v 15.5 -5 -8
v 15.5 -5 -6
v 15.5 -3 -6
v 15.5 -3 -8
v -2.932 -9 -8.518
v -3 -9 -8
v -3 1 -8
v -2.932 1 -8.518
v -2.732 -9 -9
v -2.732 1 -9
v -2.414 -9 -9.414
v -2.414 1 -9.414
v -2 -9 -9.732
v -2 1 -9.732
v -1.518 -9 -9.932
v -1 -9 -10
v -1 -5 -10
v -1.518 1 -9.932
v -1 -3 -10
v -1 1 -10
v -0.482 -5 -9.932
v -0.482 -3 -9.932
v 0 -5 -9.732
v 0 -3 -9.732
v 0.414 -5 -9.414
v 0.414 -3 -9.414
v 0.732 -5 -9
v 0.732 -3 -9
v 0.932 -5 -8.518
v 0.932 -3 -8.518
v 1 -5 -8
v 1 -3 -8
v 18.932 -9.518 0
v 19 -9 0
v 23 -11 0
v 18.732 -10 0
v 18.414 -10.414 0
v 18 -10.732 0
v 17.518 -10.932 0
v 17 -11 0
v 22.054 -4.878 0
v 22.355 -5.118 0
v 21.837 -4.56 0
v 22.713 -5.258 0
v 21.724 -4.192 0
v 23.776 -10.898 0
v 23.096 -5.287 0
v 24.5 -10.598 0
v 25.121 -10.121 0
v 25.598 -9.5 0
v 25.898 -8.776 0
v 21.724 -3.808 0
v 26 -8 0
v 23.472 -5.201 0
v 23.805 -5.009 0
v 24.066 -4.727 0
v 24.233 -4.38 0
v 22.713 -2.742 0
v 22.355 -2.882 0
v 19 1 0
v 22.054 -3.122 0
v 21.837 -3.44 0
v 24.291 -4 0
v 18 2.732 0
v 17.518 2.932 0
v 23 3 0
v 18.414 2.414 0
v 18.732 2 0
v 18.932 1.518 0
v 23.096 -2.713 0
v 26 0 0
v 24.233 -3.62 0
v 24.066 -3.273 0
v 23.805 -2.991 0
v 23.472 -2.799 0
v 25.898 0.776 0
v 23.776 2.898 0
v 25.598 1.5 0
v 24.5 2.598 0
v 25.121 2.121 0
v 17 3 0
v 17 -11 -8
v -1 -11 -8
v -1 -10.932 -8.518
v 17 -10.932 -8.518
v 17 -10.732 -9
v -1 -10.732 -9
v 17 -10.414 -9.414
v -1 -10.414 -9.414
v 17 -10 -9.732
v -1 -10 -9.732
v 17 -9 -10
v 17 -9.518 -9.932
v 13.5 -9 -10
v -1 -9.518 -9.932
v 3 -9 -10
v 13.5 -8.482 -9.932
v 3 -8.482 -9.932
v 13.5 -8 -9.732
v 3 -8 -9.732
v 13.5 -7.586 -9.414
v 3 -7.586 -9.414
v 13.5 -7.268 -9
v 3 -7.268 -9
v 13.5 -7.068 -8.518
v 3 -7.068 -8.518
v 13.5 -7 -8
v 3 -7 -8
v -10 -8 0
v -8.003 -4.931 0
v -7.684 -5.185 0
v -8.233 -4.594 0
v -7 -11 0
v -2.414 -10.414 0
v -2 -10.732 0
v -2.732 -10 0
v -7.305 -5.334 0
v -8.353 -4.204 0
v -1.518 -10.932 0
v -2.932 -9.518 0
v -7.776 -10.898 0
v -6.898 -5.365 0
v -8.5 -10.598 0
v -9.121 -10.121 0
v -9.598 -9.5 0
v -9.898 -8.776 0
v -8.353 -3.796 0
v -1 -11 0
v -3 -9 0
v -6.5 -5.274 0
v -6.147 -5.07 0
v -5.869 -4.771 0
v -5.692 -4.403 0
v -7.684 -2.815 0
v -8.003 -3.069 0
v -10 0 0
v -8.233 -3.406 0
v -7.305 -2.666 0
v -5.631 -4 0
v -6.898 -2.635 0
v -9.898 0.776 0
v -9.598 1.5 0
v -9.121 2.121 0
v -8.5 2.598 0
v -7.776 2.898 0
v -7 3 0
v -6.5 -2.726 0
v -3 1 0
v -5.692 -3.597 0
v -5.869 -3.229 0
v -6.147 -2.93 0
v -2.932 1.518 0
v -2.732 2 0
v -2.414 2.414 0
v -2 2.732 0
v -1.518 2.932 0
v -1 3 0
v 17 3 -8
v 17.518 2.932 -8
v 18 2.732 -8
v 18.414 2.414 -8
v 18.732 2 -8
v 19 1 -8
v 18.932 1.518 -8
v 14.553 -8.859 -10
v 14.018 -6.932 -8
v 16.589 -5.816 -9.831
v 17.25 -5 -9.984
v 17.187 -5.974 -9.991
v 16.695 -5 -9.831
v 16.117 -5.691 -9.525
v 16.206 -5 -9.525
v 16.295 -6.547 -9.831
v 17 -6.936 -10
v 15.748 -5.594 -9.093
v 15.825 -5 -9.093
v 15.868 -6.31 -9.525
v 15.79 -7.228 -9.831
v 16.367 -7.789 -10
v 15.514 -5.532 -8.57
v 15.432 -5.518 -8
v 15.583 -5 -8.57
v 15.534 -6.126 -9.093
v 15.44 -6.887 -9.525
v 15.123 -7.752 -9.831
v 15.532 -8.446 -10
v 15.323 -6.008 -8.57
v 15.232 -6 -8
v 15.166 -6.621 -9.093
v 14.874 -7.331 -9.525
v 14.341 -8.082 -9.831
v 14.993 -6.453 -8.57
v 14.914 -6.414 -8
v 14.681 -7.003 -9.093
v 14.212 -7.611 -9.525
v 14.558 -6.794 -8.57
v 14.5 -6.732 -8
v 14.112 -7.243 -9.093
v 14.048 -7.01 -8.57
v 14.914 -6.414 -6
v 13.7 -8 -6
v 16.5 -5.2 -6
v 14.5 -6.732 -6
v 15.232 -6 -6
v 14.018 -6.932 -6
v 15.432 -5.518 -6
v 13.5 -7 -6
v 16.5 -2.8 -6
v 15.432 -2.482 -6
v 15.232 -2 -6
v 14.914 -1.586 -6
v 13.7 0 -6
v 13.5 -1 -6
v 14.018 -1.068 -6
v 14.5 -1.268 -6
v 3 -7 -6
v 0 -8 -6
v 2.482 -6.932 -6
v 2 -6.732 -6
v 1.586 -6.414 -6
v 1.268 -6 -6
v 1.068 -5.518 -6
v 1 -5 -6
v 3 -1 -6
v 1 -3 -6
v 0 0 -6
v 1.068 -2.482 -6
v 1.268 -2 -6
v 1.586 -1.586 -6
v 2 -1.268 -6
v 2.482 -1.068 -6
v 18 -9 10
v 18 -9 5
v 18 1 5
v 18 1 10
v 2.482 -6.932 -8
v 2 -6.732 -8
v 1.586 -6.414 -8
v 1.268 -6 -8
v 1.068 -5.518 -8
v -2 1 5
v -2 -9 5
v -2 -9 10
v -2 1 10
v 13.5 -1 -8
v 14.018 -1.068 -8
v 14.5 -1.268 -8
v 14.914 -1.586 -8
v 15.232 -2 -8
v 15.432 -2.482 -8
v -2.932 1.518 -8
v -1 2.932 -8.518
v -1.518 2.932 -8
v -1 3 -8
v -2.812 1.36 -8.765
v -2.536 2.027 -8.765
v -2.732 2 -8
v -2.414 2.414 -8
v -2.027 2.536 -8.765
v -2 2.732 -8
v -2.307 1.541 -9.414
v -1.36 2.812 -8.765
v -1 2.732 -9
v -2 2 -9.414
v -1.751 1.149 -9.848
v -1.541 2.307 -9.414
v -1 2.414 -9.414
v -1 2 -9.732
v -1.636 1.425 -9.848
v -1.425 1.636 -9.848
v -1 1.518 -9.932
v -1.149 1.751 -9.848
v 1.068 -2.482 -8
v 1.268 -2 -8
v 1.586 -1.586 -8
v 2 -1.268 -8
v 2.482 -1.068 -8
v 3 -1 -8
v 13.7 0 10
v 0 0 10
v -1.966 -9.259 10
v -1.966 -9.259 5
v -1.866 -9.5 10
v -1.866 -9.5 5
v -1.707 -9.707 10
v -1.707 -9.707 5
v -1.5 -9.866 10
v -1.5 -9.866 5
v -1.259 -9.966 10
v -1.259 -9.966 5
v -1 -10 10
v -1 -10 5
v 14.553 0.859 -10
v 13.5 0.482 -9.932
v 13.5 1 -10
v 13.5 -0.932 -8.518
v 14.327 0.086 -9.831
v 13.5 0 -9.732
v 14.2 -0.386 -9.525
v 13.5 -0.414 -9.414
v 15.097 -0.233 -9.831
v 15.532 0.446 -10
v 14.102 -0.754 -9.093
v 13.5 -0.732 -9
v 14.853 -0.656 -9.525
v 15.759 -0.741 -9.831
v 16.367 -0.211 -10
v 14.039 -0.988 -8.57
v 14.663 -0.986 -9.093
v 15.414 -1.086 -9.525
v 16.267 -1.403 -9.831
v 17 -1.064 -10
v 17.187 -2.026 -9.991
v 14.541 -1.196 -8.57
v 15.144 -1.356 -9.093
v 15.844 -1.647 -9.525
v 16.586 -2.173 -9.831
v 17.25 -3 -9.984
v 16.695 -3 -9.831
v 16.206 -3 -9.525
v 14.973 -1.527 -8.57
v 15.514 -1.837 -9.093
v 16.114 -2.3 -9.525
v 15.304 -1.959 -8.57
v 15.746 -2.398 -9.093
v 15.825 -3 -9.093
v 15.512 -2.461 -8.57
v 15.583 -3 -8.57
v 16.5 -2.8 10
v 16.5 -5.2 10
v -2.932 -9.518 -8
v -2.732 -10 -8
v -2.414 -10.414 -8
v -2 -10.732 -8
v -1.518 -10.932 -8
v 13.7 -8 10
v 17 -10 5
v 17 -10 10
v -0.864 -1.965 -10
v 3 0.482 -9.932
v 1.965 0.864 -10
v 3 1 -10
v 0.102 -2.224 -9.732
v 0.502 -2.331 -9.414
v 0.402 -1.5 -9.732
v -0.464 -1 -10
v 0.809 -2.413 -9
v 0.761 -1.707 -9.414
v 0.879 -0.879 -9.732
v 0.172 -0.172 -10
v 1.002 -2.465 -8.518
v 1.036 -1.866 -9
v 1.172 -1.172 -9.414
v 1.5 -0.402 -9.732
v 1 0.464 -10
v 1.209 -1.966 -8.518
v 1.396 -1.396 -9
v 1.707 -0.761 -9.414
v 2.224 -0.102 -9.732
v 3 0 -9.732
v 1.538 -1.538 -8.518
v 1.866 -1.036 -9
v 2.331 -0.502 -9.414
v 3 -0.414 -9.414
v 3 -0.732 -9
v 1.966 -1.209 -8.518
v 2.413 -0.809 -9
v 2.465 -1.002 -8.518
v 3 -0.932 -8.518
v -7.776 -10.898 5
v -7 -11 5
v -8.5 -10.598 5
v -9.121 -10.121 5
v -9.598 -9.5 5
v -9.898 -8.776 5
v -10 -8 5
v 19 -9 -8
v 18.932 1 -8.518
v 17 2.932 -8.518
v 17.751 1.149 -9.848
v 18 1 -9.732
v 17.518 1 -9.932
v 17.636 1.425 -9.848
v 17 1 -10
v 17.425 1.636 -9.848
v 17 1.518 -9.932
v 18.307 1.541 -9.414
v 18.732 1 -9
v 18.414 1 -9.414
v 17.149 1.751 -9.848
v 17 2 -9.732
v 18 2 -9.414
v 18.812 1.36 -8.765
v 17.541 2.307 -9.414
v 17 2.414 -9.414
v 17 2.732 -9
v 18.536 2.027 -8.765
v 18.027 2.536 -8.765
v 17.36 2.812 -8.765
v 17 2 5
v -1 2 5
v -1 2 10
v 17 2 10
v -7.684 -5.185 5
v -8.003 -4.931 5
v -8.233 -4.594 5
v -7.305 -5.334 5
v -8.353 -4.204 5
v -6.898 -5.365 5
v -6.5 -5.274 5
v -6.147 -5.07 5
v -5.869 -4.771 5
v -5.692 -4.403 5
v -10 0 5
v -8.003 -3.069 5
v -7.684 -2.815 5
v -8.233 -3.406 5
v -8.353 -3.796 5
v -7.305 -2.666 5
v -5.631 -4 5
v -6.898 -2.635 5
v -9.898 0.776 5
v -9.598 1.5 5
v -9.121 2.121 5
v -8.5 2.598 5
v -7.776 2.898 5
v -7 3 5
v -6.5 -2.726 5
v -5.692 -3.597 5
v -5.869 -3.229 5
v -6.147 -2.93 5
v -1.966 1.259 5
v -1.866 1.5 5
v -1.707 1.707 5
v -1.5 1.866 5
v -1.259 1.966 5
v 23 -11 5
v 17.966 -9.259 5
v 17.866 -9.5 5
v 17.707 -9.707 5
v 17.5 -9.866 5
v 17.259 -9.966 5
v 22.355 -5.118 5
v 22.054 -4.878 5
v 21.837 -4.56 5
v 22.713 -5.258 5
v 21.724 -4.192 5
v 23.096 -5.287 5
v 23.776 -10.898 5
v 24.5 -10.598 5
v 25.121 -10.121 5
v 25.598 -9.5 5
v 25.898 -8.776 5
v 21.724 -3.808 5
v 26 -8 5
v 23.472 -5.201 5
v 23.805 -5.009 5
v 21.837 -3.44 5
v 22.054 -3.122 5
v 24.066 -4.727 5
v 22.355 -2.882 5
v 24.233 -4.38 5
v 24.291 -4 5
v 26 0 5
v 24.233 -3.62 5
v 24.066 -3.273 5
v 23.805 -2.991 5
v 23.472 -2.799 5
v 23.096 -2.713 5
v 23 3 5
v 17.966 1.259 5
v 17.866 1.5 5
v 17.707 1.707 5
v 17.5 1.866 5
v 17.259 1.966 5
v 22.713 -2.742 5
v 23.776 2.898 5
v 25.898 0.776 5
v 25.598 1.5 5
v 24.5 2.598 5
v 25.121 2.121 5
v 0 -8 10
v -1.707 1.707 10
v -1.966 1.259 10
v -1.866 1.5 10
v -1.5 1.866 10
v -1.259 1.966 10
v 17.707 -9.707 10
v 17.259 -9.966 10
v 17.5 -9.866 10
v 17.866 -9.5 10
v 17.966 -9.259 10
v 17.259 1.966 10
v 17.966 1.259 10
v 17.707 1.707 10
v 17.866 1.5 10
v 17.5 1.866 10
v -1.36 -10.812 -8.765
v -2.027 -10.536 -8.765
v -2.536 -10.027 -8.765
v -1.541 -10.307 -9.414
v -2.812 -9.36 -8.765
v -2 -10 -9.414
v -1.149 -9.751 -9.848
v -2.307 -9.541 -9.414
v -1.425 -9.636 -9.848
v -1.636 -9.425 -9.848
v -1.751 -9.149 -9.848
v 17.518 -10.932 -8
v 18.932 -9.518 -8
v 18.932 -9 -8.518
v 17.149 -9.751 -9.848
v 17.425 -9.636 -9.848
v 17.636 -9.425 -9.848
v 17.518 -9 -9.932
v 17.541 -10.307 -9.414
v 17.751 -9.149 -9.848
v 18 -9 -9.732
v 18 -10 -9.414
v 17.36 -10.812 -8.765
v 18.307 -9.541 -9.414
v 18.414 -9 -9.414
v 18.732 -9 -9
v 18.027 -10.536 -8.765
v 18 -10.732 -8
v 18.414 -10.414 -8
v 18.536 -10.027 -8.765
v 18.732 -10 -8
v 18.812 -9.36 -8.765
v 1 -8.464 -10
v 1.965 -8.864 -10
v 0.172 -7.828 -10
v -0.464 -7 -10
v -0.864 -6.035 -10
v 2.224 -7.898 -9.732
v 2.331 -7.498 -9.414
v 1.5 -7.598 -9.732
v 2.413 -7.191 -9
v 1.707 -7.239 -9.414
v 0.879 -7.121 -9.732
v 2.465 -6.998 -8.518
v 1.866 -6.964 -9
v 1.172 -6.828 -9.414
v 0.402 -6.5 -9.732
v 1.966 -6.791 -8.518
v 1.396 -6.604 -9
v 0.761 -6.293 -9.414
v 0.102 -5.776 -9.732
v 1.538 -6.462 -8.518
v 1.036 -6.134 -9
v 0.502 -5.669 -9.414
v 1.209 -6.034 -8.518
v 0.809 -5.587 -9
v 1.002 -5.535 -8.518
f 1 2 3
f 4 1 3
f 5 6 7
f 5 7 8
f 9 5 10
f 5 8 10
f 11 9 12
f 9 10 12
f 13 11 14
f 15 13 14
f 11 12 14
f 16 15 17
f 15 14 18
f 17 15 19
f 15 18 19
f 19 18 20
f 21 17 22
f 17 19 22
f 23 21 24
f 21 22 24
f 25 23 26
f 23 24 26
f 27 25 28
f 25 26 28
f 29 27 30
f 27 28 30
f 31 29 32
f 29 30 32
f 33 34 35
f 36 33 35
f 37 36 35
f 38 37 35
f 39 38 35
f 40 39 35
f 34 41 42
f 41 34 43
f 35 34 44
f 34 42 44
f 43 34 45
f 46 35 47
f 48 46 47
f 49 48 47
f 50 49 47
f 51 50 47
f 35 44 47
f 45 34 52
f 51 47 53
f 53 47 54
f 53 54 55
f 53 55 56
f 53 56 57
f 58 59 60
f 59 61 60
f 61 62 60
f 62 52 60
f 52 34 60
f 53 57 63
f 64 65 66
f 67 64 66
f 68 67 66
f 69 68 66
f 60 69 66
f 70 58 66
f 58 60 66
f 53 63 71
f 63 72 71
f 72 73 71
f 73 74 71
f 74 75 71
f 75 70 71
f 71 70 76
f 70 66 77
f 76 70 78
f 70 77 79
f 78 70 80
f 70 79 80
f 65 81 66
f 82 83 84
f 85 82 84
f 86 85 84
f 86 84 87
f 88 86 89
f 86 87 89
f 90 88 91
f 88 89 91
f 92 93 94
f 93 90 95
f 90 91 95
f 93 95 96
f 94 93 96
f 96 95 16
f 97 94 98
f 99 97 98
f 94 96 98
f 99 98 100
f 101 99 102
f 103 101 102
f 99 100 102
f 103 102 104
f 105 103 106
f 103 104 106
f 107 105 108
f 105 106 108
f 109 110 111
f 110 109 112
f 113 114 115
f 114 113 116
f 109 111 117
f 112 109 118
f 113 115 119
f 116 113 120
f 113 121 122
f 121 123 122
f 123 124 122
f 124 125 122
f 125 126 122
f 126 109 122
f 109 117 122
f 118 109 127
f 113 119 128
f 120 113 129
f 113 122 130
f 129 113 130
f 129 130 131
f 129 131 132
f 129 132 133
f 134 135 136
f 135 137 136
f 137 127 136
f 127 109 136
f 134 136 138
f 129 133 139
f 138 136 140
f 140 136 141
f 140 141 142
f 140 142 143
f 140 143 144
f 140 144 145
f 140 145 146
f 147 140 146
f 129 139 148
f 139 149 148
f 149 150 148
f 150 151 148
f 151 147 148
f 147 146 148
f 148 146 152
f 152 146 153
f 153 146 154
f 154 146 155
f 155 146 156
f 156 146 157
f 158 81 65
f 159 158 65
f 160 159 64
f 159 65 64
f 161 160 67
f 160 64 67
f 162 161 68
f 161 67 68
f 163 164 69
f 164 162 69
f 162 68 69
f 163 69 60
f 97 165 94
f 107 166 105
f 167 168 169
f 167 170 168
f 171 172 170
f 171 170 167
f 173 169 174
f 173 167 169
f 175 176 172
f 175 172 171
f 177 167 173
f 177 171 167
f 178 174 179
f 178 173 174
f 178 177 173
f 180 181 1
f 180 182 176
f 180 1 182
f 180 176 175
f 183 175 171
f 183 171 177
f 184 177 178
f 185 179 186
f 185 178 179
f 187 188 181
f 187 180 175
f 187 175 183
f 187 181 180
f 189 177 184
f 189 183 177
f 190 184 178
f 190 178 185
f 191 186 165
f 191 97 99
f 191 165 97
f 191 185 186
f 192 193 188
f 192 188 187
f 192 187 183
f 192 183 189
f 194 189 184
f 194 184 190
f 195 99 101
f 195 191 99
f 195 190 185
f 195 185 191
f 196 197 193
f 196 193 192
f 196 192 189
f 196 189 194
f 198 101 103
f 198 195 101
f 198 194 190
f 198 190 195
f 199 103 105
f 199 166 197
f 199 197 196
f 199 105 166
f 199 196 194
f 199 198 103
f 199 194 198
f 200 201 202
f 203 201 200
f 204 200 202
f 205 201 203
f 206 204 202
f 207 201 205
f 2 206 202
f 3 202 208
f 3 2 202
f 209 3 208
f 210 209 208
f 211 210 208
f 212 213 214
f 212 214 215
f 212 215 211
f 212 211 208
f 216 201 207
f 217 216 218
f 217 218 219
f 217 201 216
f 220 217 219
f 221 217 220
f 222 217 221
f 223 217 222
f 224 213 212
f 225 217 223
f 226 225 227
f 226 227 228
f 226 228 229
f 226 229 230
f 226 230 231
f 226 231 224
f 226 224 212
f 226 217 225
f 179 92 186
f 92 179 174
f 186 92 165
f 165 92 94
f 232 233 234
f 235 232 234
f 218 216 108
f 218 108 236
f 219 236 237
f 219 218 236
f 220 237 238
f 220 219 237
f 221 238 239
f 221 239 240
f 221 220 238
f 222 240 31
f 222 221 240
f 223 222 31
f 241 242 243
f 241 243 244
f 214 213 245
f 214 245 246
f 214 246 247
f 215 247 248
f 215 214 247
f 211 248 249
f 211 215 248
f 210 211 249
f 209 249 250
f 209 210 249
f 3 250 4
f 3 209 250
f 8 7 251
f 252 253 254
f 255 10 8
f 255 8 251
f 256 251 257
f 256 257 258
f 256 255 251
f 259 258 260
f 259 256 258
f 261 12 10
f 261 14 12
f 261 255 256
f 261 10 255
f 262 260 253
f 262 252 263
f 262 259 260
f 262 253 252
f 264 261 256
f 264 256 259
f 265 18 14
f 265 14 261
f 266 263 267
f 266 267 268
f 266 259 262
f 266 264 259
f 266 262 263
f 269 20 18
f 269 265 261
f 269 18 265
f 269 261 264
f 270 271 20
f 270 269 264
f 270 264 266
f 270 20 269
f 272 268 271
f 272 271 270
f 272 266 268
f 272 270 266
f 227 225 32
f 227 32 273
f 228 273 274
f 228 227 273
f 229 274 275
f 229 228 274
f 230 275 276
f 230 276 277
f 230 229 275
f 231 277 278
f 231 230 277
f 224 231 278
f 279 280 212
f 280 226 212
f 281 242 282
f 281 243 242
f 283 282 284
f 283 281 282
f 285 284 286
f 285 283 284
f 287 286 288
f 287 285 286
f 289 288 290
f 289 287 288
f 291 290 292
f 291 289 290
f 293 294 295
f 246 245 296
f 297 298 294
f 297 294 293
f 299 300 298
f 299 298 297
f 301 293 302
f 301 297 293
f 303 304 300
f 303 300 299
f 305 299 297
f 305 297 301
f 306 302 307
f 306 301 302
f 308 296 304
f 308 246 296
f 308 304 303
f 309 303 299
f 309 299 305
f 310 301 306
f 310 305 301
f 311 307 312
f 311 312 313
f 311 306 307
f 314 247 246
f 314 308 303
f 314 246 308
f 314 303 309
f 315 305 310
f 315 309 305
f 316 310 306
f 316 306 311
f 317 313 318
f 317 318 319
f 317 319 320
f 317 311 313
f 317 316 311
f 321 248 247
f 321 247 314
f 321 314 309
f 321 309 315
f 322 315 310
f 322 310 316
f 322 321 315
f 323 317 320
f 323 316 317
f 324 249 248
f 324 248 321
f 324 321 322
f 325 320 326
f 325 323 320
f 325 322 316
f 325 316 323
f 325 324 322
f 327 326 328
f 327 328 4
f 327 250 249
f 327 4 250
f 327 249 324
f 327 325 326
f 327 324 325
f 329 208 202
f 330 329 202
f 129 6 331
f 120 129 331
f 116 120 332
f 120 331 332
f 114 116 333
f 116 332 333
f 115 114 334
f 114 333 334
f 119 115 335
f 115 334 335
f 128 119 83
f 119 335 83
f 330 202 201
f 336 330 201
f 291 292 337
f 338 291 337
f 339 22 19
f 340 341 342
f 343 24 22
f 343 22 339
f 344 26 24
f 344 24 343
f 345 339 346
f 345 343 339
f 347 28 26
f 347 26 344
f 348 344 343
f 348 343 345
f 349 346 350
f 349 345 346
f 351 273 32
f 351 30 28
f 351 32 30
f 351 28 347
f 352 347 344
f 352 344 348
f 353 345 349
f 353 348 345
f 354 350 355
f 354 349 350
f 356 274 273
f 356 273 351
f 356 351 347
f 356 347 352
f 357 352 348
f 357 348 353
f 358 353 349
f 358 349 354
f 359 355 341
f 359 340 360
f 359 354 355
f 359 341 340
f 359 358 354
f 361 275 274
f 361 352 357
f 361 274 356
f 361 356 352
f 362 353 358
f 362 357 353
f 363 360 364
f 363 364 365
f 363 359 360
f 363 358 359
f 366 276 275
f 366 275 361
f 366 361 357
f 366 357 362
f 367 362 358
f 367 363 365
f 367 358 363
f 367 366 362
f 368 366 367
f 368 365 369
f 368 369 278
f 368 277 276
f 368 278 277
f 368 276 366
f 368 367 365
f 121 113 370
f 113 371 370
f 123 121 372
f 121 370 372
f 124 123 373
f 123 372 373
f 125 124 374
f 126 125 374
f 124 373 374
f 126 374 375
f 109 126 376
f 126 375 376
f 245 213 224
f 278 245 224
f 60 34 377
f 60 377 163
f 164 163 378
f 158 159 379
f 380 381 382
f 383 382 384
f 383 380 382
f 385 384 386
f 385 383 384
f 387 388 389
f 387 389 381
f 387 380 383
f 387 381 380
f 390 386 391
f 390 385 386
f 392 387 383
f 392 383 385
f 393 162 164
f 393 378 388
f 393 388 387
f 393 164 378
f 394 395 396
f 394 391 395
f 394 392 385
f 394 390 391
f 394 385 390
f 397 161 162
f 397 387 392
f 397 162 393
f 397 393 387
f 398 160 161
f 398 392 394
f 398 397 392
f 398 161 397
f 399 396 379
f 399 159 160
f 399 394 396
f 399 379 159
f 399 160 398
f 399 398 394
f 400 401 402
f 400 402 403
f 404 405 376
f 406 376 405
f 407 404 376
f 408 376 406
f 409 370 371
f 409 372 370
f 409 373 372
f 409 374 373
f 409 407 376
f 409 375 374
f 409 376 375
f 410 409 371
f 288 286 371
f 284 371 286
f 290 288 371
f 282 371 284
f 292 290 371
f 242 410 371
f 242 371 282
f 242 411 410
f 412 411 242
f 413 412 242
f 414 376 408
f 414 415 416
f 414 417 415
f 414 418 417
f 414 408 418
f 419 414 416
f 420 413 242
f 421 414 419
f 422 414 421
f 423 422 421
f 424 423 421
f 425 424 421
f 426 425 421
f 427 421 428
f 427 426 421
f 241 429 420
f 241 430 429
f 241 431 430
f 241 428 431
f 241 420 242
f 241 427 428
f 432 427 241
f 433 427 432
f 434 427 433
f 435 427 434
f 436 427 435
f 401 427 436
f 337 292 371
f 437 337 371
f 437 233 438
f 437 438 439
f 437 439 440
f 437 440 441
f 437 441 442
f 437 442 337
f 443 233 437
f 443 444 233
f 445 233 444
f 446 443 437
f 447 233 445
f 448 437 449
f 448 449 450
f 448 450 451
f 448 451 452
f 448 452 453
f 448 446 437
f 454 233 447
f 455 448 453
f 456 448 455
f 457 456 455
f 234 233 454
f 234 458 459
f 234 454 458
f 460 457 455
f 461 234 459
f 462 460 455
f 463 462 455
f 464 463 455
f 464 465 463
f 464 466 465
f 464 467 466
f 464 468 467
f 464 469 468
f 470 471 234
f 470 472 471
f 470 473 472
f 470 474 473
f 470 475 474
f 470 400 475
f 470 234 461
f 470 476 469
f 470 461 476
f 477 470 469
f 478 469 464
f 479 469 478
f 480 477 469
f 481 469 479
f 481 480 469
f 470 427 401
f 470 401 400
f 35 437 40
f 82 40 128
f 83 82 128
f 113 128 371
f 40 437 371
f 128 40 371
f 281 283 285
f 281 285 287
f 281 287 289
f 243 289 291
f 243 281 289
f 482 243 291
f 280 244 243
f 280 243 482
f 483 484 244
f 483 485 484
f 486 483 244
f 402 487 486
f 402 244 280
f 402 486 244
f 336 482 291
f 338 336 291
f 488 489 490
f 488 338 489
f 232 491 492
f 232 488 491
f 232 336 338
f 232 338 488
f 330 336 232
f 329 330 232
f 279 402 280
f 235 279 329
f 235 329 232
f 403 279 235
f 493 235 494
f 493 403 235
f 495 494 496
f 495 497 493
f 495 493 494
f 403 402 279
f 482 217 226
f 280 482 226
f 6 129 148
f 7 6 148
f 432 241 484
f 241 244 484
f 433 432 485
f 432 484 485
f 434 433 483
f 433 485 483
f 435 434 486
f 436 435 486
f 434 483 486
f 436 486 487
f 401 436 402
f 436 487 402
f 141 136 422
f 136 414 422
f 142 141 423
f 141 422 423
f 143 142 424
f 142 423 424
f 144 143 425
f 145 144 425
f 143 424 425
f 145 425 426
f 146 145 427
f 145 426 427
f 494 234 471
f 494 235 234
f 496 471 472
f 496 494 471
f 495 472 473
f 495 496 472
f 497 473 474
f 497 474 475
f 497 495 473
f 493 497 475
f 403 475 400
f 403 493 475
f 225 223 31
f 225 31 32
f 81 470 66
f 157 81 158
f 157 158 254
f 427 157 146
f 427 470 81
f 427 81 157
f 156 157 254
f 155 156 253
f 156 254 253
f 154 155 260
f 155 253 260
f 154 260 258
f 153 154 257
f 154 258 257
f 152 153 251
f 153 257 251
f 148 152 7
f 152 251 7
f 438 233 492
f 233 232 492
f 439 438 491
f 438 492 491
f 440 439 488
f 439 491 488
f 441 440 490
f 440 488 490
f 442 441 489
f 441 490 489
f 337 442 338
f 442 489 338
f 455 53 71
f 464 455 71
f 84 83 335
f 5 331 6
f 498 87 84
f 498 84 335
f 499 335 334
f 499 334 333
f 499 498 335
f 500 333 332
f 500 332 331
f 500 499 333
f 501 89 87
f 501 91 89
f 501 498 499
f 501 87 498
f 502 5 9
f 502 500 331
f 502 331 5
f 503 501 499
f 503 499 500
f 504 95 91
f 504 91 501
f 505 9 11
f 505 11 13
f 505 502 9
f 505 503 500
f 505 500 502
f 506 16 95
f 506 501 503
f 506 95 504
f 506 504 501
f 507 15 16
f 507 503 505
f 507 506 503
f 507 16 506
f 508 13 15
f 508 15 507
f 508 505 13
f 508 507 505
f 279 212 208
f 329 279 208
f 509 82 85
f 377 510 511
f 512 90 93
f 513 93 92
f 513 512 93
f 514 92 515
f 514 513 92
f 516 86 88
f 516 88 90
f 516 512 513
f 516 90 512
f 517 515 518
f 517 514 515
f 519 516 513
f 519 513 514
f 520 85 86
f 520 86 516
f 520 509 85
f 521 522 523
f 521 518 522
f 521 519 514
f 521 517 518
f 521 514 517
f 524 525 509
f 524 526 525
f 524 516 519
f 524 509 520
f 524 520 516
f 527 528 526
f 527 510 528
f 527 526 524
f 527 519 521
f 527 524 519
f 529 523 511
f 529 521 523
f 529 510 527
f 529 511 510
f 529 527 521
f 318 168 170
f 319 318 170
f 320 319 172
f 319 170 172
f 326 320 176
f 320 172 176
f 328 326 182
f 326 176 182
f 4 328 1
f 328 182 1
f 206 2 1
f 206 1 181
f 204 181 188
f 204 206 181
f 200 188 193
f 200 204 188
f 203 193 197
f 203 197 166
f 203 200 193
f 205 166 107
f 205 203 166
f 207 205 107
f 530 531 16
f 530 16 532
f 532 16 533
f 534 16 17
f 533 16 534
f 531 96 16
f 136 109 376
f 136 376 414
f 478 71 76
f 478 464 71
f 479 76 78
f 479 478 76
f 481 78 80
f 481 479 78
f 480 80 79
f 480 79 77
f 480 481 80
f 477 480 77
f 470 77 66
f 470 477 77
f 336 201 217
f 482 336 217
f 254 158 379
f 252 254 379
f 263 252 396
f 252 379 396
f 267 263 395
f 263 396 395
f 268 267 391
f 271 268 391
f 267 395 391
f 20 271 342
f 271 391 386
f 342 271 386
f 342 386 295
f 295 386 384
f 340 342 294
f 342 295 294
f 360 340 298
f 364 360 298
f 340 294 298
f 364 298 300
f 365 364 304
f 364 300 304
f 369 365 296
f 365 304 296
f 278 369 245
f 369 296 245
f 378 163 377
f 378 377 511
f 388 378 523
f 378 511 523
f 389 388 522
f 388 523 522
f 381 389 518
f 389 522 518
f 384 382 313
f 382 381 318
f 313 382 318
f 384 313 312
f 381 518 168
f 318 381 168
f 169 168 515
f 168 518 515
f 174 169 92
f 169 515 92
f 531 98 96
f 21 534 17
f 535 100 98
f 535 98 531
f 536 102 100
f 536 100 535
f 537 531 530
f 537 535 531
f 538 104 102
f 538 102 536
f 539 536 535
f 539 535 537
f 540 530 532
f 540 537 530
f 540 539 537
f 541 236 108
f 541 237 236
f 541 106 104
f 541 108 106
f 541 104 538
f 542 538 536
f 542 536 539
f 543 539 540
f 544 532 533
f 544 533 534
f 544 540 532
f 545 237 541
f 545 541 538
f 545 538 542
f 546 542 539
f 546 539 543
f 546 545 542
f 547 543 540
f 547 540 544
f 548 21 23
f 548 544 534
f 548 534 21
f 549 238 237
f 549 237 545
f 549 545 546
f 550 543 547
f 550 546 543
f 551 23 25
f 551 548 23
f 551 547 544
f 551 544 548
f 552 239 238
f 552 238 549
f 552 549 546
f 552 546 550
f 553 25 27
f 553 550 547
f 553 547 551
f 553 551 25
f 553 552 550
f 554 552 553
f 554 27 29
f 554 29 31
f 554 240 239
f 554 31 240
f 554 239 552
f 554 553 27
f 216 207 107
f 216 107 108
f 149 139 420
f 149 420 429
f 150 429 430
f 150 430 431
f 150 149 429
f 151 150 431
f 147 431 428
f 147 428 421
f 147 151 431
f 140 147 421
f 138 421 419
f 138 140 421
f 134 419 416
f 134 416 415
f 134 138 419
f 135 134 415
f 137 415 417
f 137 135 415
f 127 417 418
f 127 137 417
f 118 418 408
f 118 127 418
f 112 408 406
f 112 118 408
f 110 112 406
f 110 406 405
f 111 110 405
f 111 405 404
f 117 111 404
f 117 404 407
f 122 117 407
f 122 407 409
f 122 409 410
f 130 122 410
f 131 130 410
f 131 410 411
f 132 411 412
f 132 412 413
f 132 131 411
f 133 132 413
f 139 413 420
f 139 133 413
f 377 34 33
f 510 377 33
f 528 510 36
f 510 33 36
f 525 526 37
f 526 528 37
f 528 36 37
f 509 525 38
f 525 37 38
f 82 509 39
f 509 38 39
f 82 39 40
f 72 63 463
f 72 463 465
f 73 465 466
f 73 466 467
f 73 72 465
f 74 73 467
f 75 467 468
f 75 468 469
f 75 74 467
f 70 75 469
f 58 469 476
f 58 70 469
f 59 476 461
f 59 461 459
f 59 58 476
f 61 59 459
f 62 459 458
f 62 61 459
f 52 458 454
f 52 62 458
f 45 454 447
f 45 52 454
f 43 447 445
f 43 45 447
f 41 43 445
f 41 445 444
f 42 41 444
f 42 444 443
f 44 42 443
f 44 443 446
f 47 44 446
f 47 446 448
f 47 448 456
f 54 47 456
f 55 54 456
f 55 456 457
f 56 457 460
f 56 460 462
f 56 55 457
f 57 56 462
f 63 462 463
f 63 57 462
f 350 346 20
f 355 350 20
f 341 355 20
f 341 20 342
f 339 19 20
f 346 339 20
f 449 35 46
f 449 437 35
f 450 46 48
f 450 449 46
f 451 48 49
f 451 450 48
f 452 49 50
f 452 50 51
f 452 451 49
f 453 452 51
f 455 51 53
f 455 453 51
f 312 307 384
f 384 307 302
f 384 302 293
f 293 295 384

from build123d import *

# Parameters (mm, degrees)
SKETCH_1_W      = 36
SKETCH_1_H      = 14
SKETCH_1_R      = 1.368610336
SKETCH_1_R_2    = 1.290695583
EXTRUDE_1_DEPTH = 5
SKETCH_2_W      = 22
SKETCH_2_H      = 14
EXTRUDE_2_DEPTH = 6
SKETCH_3_W      = 22
SKETCH_3_H      = 14
SKETCH_3_W_2    = 14.5
SKETCH_3_H_2    = 6
EXTRUDE_3_DEPTH = 4
FILLET_1_R      = 3
FILLET_2_R      = 2
FILLET_3_R      = 2
SKETCH_4_W      = 20
SKETCH_4_H      = 12
EXTRUDE_4_DEPTH = 5
FILLET_4_R      = 1


with BuildPart() as part:
    # Эскиз1 → Бобышка-Вытянуть1 (new body)
    with BuildSketch(Plane.XY):
        with Locations((8, -4)):
            Rectangle(SKETCH_1_W, SKETCH_1_H)
        with Locations((-7, -4)):
            Circle(SKETCH_1_R, mode=Mode.SUBTRACT)
        with Locations((23, -4)):
            Circle(SKETCH_1_R_2, mode=Mode.SUBTRACT)
        Polygon((13.7, 0), (16.5, -2.8), (16.5, -5.2), (13.7, -8), (0, -8), (0, 0), align=None, mode=Mode.SUBTRACT)
    extrude(amount=EXTRUDE_1_DEPTH)

    # Эскиз2 → Бобышка-Вытянуть2 (add)
    with BuildSketch(Plane(origin=(0, 0, 0), x_dir=(-1, 0, 0), z_dir=(0, 0, -1))):
        with Locations((-8, -4)):
            Rectangle(SKETCH_2_W, SKETCH_2_H)
        Polygon((-16.5, -2.8), (-13.7, 0), (0, 0), (0, -8), (-13.7, -8), (-16.5, -5.2), align=None, mode=Mode.SUBTRACT)
    extrude(amount=EXTRUDE_2_DEPTH)

    # Эскиз3 → Бобышка-Вытянуть3 (add)
    with BuildSketch(Plane(origin=(0, 0, -6), x_dir=(-1, 0, 0), z_dir=(0, 0, -1))):
        with Locations((-8, -4)):
            Rectangle(SKETCH_3_W, SKETCH_3_H)
        with Locations((-8.25, -4)):
            Rectangle(SKETCH_3_W_2, SKETCH_3_H_2, mode=Mode.SUBTRACT)
    extrude(amount=EXTRUDE_3_DEPTH)

    # Скругление1
    fillet_1_edges = [part.edges().sort_by_distance(p)[0] for p in [
        (-10, 3, 2.5),
        (26, 3, 2.5),
        (26, -11, 2.5),
        (-10, -11, 2.5),
    ]]
    fillet(fillet_1_edges, radius=FILLET_1_R)

    # Скругление2
    # the kernel refuses this fillet: 2 mm, written as the material it adds along each edge
    with BuildSketch(Plane(origin=(15.5, -7, -6), x_dir=(0, 1, 0), z_dir=(0, 0, -1)), Plane(origin=(1, -7, -6), x_dir=(1, 0, 0), z_dir=(0, 0, -1)), Plane(origin=(1, -1, -6), x_dir=(0, -1, 0), z_dir=(0, 0, -1))) as fillet_2_piece_1:
        with BuildLine():
            CenterArc((FILLET_2_R, -FILLET_2_R), FILLET_2_R, 90, 90)
            Line((0, -FILLET_2_R), (0, 0))
            Line((0, 0), (FILLET_2_R, 0))
        make_face()
    extrude(amount=4)
    with BuildSketch(Plane(origin=(15.5, -1, -6), x_dir=(0, -1, 0), z_dir=(0, 0, -1))) as fillet_2_piece_2:
        with BuildLine():
            CenterArc((FILLET_2_R, FILLET_2_R), FILLET_2_R, 180, 90)
            Line((0, FILLET_2_R), (0, 0))
            Line((0, 0), (FILLET_2_R, 0))
        make_face()
    extrude(amount=4)
    # the kernel refuses this fillet: 2 mm, written as the material it takes off along each edge
    with BuildSketch(Plane(origin=(19, 3, 0), x_dir=(-1, 0, 0), z_dir=(0, 0, -1)), Plane(origin=(-3, 3, -15), x_dir=(1, 0, 0), z_dir=(0, 0, 1))) as fillet_2_2_piece_1:
        with BuildLine():
            CenterArc((FILLET_2_R, -FILLET_2_R), FILLET_2_R, 90, 90)
            Line((0, -FILLET_2_R), (0, 0))
            Line((0, 0), (FILLET_2_R, 0))
        make_face()
    extrude(amount=15, mode=Mode.SUBTRACT)
    with BuildSketch(Plane(origin=(19, -11, 0), x_dir=(-1, 0, 0), z_dir=(0, 0, -1)), Plane(origin=(-3, -11, -15), x_dir=(1, 0, 0), z_dir=(0, 0, 1))) as fillet_2_2_piece_2:
        with BuildLine():
            CenterArc((FILLET_2_R, FILLET_2_R), FILLET_2_R, 180, 90)
            Line((0, FILLET_2_R), (0, 0))
            Line((0, 0), (FILLET_2_R, 0))
        make_face()
    extrude(amount=15, mode=Mode.SUBTRACT)

    # Скругление3
    # the kernel refuses this fillet: 2 mm, written as the material it takes off along each edge
    with BuildSketch(Plane(origin=(13.5, -1, -10), x_dir=(0, 1, 0), z_dir=(-1, 0, 0)), Plane(origin=(3, -7, -10), x_dir=(0, -1, 0), z_dir=(1, 0, 0))) as fillet_3_piece_1:
        with BuildLine():
            CenterArc((FILLET_3_R, -FILLET_3_R), FILLET_3_R, 90, 90)
            Line((0, -FILLET_3_R), (0, 0))
            Line((0, 0), (FILLET_3_R, 0))
        make_face()
    extrude(amount=10.5, mode=Mode.SUBTRACT)
    with BuildSketch(Plane(origin=(15.5, -5, -10), x_dir=(1, 0, 0), z_dir=(0, 1, 0)), Plane(origin=(1, -3, -10), x_dir=(-1, 0, 0), z_dir=(0, -1, 0))) as fillet_3_piece_2:
        with BuildLine():
            CenterArc((FILLET_3_R, -FILLET_3_R), FILLET_3_R, 90, 90)
            Line((0, -FILLET_3_R), (0, 0))
            Line((0, 0), (FILLET_3_R, 0))
        make_face()
    extrude(amount=2, mode=Mode.SUBTRACT)
    with BuildSketch(Plane(origin=(-3, 1, -10), x_dir=(1, 0, 0), z_dir=(0, -1, 0)), Plane(origin=(19, -9, -10), x_dir=(-1, 0, 0), z_dir=(0, 1, 0))) as fillet_3_piece_3:
        with BuildLine():
            CenterArc((FILLET_3_R, FILLET_3_R), FILLET_3_R, 180, 90)
            Line((0, FILLET_3_R), (0, 0))
            Line((0, 0), (FILLET_3_R, 0))
        make_face()
    extrude(amount=10, mode=Mode.SUBTRACT)
    with BuildSketch(Plane(origin=(-1, -11, -10), x_dir=(0, 1, 0), z_dir=(1, 0, 0)), Plane(origin=(17, 3, -10), x_dir=(0, -1, 0), z_dir=(-1, 0, 0))) as fillet_3_piece_4:
        with BuildLine():
            CenterArc((FILLET_3_R, FILLET_3_R), FILLET_3_R, 180, 90)
            Line((0, FILLET_3_R), (0, 0))
            Line((0, 0), (FILLET_3_R, 0))
        make_face()
    extrude(amount=18, mode=Mode.SUBTRACT)
    with BuildSketch(Plane(origin=(17, 1, -10), x_dir=(1, 0, 0), z_dir=(0, -1, 0))) as fillet_3_piece_5:
        with BuildLine():
            CenterArc((2 - FILLET_3_R, FILLET_3_R), FILLET_3_R, 270, 90)
            Line((2, FILLET_3_R), (2, 0))
            Line((2, 0), (2 - FILLET_3_R, 0))
        make_face()
    revolve(axis=Axis((17, 1, -10), (0, 0, 1)), revolution_arc=90, mode=Mode.SUBTRACT)
    with BuildSketch(Plane(origin=(17, -9, -10), x_dir=(0, -1, 0), z_dir=(-1, 0, 0))) as fillet_3_piece_6:
        with BuildLine():
            CenterArc((2 - FILLET_3_R, FILLET_3_R), FILLET_3_R, 270, 90)
            Line((2, FILLET_3_R), (2, 0))
            Line((2, 0), (2 - FILLET_3_R, 0))
        make_face()
    revolve(axis=Axis((17, -9, -10), (0, 0, 1)), revolution_arc=90, mode=Mode.SUBTRACT)
    with BuildSketch(Plane(origin=(-1, 1, -10), x_dir=(-1, 0, 0), z_dir=(0, -1, 0))) as fillet_3_piece_7:
        with BuildLine():
            CenterArc((2 - FILLET_3_R, -FILLET_3_R), FILLET_3_R, 0, 90)
            Line((2, -FILLET_3_R), (2, 0))
            Line((2, 0), (2 - FILLET_3_R, 0))
        make_face()
    revolve(axis=Axis((-1, 1, -10), (0, 0, -1)), revolution_arc=90, mode=Mode.SUBTRACT)
    with BuildSketch(Plane(origin=(-1, -9, -10), x_dir=(0, -1, 0), z_dir=(1, 0, 0))) as fillet_3_piece_8:
        with BuildLine():
            CenterArc((2 - FILLET_3_R, -FILLET_3_R), FILLET_3_R, 0, 90)
            Line((2, -FILLET_3_R), (2, 0))
            Line((2, 0), (2 - FILLET_3_R, 0))
        make_face()
    revolve(axis=Axis((-1, -9, -10), (0, 0, -1)), revolution_arc=90, mode=Mode.SUBTRACT)
    with BuildSketch(Plane(origin=(13.5, -3, -10), x_dir=(0, 1, 0), z_dir=(-1, 0, 0))) as fillet_3_piece_9:
        with BuildLine():
            CenterArc((2 + FILLET_3_R, -FILLET_3_R), FILLET_3_R, 90, 90)
            Line((2 + FILLET_3_R, 0), (2, 0))
            Line((2, 0), (2, -FILLET_3_R))
        make_face()
    revolve(axis=Axis((13.5, -3, -10), (0, 0, -1)), revolution_arc=90, mode=Mode.SUBTRACT)
    with BuildSketch(Plane(origin=(13.5, -5, -10), x_dir=(1, 0, 0), z_dir=(0, 1, 0))) as fillet_3_piece_10:
        with BuildLine():
            CenterArc((2 + FILLET_3_R, -FILLET_3_R), FILLET_3_R, 90, 90)
            Line((2, -FILLET_3_R), (2, 0))
            Line((2, 0), (2 + FILLET_3_R, 0))
        make_face()
    revolve(axis=Axis((13.5, -5, -10), (0, 0, -1)), revolution_arc=90, mode=Mode.SUBTRACT)
    with BuildSketch(Plane(origin=(3, -5, -10), x_dir=(0, -1, 0), z_dir=(1, 0, 0))) as fillet_3_piece_11:
        with BuildLine():
            CenterArc((2 + FILLET_3_R, -FILLET_3_R), FILLET_3_R, 90, 90)
            Line((2, -FILLET_3_R), (2, 0))
            Line((2, 0), (2 + FILLET_3_R, 0))
        make_face()
    revolve(axis=Axis((3, -5, -10), (0, 0, -1)), revolution_arc=90, mode=Mode.SUBTRACT)
    with BuildSketch(Plane(origin=(3, -3, -10), x_dir=(-1, 0, 0), z_dir=(0, -1, 0))) as fillet_3_piece_12:
        with BuildLine():
            CenterArc((2 + FILLET_3_R, -FILLET_3_R), FILLET_3_R, 90, 90)
            Line((2, -FILLET_3_R), (2, 0))
            Line((2, 0), (2 + FILLET_3_R, 0))
        make_face()
    revolve(axis=Axis((3, -3, -10), (0, 0, -1)), revolution_arc=90, mode=Mode.SUBTRACT)

    # Эскиз4 → Бобышка-Вытянуть4 (add)
    with BuildSketch(Plane.XY.offset(5)):
        with Locations((8, -4)):
            Rectangle(SKETCH_4_W, SKETCH_4_H)
        Polygon((0, 0), (13.7, 0), (16.5, -2.8), (16.5, -5.2), (13.7, -8), (0, -8), align=None, mode=Mode.SUBTRACT)
    extrude(amount=EXTRUDE_4_DEPTH)

    # Скругление4
    fillet_4_edges = [part.edges().sort_by_distance(p)[0] for p in [
        (-2, 2, 7.5),
        (-2, -10, 7.5),
        (18, -10, 7.5),
        (18, 2, 7.5),
    ]]
    fillet(fillet_4_edges, radius=FILLET_4_R)


solid = part.part
